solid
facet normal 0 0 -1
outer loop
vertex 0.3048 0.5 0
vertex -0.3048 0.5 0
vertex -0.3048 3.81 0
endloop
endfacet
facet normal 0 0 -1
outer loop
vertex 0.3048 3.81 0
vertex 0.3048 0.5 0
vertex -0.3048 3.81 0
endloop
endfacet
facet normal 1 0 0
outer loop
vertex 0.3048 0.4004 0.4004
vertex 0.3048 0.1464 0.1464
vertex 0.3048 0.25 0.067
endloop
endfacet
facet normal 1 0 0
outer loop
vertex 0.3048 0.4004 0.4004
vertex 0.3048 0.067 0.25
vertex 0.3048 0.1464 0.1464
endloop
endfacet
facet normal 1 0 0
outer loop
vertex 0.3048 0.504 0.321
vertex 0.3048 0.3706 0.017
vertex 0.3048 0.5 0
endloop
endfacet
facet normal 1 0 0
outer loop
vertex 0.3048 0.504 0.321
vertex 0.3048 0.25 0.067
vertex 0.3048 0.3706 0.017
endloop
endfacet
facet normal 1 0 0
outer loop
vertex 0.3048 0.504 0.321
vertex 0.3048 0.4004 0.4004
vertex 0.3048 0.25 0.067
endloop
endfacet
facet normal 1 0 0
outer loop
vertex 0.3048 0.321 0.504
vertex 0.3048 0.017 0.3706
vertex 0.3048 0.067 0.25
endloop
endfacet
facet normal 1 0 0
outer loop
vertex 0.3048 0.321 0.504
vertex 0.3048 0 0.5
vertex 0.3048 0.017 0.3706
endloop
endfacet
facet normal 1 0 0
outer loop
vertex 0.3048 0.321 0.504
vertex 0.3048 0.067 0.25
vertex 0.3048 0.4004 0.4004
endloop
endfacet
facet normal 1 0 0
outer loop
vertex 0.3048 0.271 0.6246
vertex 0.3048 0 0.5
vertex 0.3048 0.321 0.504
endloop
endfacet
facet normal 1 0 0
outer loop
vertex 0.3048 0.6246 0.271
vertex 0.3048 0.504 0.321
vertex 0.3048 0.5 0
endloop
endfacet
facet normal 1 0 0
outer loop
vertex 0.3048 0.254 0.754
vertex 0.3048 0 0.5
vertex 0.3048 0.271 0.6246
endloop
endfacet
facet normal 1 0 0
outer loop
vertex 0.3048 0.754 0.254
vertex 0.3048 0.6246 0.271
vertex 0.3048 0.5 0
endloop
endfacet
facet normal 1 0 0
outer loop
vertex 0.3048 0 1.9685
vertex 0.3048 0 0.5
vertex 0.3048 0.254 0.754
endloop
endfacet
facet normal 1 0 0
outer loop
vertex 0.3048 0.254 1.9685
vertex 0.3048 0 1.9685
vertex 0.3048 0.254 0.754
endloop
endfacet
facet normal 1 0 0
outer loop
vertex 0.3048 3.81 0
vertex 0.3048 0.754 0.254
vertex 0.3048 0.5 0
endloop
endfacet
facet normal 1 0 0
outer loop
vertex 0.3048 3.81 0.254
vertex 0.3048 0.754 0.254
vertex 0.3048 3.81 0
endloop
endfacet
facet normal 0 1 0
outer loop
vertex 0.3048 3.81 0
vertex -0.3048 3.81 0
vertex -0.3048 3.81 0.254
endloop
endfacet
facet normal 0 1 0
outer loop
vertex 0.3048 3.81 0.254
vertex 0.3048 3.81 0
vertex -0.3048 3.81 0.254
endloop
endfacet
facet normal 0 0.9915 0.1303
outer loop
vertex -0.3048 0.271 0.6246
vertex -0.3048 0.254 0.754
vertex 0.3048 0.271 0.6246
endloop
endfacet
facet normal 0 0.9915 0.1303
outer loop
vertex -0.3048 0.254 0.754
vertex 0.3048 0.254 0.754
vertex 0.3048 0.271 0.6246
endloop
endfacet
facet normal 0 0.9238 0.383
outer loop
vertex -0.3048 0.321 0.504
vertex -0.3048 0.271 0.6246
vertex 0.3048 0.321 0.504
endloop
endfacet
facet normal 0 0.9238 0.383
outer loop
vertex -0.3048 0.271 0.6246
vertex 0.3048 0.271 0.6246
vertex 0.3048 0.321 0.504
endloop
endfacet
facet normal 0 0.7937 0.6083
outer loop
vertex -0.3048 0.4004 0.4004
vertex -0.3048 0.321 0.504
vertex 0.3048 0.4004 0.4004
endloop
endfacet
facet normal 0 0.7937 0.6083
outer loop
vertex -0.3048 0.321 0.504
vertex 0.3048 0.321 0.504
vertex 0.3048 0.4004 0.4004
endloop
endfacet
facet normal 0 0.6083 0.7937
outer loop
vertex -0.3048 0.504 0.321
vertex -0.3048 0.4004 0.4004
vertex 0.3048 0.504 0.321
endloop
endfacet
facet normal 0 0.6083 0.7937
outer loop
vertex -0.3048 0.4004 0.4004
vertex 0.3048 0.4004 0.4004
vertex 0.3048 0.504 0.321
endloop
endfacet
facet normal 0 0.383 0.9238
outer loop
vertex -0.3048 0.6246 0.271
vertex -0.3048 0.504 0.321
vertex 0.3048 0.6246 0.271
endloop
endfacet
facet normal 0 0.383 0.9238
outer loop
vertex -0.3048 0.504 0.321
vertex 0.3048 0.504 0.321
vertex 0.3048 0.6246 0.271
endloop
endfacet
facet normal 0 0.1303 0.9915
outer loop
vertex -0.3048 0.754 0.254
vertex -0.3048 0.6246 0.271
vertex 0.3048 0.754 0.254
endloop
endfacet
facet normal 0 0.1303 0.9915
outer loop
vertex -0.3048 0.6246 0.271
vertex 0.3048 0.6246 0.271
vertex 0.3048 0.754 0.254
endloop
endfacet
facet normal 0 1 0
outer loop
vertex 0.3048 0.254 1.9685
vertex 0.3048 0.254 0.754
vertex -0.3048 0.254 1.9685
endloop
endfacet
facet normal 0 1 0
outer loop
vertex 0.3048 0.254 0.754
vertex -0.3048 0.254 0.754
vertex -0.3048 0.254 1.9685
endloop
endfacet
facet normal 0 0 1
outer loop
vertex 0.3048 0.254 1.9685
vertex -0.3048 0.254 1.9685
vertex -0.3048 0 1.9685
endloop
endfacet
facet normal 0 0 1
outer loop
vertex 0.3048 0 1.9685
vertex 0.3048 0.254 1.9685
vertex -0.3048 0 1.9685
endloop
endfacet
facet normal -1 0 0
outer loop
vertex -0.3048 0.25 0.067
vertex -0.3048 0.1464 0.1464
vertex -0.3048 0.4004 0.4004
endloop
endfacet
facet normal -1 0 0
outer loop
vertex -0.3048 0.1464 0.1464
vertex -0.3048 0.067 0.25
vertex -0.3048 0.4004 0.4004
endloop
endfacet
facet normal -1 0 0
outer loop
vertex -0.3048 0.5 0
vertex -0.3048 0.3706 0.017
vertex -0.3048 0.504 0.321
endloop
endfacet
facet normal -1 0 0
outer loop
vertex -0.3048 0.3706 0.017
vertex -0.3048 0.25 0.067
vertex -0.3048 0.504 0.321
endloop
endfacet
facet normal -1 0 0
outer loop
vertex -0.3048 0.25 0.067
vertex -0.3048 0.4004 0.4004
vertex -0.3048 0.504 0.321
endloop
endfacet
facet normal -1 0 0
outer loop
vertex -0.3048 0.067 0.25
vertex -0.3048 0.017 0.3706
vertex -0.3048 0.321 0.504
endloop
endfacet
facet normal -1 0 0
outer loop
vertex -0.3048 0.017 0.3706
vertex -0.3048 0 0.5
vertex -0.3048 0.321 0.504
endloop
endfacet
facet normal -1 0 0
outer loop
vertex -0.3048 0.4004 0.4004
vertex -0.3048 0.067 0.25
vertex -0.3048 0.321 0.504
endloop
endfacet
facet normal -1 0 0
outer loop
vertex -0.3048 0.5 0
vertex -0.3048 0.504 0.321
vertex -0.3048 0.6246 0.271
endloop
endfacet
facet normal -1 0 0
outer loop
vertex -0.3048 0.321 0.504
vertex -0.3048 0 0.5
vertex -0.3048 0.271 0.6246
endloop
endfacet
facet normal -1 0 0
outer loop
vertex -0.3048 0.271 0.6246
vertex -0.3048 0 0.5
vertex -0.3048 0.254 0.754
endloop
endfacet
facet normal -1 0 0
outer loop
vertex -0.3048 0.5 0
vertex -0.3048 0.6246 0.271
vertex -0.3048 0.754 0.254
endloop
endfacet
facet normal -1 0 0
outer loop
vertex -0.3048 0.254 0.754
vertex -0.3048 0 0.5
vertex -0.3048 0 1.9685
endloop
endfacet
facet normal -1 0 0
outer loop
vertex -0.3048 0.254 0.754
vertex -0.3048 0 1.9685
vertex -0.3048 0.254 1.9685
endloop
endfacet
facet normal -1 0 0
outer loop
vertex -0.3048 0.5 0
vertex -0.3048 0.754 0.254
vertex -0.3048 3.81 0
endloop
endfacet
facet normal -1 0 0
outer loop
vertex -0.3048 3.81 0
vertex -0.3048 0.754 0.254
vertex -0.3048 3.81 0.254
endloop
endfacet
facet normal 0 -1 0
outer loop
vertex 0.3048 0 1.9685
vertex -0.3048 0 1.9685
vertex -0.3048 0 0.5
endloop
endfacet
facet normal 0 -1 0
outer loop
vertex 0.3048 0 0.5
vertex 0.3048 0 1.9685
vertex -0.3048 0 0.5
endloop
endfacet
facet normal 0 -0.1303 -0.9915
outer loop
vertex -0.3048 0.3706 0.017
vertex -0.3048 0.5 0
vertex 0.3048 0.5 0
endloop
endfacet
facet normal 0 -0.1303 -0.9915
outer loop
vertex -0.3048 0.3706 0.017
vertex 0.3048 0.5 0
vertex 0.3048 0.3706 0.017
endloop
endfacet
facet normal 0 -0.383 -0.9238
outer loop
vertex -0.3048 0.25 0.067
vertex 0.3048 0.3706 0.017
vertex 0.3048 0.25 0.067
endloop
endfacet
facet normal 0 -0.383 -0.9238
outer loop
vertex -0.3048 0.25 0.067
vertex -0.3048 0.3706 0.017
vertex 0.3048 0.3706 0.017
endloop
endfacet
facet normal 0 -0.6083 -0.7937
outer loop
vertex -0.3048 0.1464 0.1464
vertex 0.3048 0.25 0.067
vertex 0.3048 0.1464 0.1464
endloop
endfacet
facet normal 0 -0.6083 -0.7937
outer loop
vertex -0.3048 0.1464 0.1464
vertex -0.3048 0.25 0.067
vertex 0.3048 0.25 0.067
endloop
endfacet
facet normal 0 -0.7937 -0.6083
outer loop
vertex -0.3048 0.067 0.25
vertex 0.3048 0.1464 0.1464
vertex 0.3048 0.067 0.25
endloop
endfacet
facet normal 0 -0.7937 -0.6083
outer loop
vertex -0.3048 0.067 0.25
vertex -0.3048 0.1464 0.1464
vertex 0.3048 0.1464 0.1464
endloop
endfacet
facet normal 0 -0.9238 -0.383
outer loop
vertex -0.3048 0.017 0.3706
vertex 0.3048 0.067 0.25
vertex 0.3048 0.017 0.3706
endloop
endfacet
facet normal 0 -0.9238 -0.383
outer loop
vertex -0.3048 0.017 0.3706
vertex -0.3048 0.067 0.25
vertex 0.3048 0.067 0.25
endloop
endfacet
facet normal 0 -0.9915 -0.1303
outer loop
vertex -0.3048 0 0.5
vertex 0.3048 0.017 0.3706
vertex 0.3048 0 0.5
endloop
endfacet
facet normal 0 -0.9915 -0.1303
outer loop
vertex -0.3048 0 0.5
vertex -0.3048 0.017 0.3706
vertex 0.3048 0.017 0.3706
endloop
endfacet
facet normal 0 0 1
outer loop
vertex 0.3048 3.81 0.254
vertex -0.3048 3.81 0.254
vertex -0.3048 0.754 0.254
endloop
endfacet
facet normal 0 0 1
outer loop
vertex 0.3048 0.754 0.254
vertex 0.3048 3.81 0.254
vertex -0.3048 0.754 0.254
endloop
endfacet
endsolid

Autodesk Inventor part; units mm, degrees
ref_plane "YZ Plane" through (0, 0, 0) normal (1, 0, 0) x (0, 1, 0)
ref_plane "XZ Plane" through (0, 0, 0) normal (0, 1, 0) x (-1, 0, 0)
ref_plane "XY Plane" through (0, 0, 0) normal (0, 0, 1) x (1, 0, 0)
sketch "Sketch1" plane through (0, 0, 0) normal (1, 0, 0) x (0, 1, 0)
  line L0 (3.81, 0.254) -> (0.254, 0.254)
  line L1 (0.254, 0.254) -> (0.254, 1.9685)
  line L2 (0.254, 1.9685) -> (0, 1.9685)
  line L3 (0, 1.9685) -> (0, 0)
  line L4 (0, 0) -> (3.81, 0)
  line L5 (3.81, 0) -> (3.81, 0.254)
  dimension "d0" = 0.254
  dimension "d1" = 3.81
  dimension "d2" = 1.7145
  dimension "d3" = 0.254
extrude "Extrusion1" add sketch "Sketch1" along normal mid plane 0.6096
fillet "Fillet1" radius 0.5 2 edges at (0, 0, 0) (0, 0.254, 0.254)
properties part number "pin" material "Copper"
